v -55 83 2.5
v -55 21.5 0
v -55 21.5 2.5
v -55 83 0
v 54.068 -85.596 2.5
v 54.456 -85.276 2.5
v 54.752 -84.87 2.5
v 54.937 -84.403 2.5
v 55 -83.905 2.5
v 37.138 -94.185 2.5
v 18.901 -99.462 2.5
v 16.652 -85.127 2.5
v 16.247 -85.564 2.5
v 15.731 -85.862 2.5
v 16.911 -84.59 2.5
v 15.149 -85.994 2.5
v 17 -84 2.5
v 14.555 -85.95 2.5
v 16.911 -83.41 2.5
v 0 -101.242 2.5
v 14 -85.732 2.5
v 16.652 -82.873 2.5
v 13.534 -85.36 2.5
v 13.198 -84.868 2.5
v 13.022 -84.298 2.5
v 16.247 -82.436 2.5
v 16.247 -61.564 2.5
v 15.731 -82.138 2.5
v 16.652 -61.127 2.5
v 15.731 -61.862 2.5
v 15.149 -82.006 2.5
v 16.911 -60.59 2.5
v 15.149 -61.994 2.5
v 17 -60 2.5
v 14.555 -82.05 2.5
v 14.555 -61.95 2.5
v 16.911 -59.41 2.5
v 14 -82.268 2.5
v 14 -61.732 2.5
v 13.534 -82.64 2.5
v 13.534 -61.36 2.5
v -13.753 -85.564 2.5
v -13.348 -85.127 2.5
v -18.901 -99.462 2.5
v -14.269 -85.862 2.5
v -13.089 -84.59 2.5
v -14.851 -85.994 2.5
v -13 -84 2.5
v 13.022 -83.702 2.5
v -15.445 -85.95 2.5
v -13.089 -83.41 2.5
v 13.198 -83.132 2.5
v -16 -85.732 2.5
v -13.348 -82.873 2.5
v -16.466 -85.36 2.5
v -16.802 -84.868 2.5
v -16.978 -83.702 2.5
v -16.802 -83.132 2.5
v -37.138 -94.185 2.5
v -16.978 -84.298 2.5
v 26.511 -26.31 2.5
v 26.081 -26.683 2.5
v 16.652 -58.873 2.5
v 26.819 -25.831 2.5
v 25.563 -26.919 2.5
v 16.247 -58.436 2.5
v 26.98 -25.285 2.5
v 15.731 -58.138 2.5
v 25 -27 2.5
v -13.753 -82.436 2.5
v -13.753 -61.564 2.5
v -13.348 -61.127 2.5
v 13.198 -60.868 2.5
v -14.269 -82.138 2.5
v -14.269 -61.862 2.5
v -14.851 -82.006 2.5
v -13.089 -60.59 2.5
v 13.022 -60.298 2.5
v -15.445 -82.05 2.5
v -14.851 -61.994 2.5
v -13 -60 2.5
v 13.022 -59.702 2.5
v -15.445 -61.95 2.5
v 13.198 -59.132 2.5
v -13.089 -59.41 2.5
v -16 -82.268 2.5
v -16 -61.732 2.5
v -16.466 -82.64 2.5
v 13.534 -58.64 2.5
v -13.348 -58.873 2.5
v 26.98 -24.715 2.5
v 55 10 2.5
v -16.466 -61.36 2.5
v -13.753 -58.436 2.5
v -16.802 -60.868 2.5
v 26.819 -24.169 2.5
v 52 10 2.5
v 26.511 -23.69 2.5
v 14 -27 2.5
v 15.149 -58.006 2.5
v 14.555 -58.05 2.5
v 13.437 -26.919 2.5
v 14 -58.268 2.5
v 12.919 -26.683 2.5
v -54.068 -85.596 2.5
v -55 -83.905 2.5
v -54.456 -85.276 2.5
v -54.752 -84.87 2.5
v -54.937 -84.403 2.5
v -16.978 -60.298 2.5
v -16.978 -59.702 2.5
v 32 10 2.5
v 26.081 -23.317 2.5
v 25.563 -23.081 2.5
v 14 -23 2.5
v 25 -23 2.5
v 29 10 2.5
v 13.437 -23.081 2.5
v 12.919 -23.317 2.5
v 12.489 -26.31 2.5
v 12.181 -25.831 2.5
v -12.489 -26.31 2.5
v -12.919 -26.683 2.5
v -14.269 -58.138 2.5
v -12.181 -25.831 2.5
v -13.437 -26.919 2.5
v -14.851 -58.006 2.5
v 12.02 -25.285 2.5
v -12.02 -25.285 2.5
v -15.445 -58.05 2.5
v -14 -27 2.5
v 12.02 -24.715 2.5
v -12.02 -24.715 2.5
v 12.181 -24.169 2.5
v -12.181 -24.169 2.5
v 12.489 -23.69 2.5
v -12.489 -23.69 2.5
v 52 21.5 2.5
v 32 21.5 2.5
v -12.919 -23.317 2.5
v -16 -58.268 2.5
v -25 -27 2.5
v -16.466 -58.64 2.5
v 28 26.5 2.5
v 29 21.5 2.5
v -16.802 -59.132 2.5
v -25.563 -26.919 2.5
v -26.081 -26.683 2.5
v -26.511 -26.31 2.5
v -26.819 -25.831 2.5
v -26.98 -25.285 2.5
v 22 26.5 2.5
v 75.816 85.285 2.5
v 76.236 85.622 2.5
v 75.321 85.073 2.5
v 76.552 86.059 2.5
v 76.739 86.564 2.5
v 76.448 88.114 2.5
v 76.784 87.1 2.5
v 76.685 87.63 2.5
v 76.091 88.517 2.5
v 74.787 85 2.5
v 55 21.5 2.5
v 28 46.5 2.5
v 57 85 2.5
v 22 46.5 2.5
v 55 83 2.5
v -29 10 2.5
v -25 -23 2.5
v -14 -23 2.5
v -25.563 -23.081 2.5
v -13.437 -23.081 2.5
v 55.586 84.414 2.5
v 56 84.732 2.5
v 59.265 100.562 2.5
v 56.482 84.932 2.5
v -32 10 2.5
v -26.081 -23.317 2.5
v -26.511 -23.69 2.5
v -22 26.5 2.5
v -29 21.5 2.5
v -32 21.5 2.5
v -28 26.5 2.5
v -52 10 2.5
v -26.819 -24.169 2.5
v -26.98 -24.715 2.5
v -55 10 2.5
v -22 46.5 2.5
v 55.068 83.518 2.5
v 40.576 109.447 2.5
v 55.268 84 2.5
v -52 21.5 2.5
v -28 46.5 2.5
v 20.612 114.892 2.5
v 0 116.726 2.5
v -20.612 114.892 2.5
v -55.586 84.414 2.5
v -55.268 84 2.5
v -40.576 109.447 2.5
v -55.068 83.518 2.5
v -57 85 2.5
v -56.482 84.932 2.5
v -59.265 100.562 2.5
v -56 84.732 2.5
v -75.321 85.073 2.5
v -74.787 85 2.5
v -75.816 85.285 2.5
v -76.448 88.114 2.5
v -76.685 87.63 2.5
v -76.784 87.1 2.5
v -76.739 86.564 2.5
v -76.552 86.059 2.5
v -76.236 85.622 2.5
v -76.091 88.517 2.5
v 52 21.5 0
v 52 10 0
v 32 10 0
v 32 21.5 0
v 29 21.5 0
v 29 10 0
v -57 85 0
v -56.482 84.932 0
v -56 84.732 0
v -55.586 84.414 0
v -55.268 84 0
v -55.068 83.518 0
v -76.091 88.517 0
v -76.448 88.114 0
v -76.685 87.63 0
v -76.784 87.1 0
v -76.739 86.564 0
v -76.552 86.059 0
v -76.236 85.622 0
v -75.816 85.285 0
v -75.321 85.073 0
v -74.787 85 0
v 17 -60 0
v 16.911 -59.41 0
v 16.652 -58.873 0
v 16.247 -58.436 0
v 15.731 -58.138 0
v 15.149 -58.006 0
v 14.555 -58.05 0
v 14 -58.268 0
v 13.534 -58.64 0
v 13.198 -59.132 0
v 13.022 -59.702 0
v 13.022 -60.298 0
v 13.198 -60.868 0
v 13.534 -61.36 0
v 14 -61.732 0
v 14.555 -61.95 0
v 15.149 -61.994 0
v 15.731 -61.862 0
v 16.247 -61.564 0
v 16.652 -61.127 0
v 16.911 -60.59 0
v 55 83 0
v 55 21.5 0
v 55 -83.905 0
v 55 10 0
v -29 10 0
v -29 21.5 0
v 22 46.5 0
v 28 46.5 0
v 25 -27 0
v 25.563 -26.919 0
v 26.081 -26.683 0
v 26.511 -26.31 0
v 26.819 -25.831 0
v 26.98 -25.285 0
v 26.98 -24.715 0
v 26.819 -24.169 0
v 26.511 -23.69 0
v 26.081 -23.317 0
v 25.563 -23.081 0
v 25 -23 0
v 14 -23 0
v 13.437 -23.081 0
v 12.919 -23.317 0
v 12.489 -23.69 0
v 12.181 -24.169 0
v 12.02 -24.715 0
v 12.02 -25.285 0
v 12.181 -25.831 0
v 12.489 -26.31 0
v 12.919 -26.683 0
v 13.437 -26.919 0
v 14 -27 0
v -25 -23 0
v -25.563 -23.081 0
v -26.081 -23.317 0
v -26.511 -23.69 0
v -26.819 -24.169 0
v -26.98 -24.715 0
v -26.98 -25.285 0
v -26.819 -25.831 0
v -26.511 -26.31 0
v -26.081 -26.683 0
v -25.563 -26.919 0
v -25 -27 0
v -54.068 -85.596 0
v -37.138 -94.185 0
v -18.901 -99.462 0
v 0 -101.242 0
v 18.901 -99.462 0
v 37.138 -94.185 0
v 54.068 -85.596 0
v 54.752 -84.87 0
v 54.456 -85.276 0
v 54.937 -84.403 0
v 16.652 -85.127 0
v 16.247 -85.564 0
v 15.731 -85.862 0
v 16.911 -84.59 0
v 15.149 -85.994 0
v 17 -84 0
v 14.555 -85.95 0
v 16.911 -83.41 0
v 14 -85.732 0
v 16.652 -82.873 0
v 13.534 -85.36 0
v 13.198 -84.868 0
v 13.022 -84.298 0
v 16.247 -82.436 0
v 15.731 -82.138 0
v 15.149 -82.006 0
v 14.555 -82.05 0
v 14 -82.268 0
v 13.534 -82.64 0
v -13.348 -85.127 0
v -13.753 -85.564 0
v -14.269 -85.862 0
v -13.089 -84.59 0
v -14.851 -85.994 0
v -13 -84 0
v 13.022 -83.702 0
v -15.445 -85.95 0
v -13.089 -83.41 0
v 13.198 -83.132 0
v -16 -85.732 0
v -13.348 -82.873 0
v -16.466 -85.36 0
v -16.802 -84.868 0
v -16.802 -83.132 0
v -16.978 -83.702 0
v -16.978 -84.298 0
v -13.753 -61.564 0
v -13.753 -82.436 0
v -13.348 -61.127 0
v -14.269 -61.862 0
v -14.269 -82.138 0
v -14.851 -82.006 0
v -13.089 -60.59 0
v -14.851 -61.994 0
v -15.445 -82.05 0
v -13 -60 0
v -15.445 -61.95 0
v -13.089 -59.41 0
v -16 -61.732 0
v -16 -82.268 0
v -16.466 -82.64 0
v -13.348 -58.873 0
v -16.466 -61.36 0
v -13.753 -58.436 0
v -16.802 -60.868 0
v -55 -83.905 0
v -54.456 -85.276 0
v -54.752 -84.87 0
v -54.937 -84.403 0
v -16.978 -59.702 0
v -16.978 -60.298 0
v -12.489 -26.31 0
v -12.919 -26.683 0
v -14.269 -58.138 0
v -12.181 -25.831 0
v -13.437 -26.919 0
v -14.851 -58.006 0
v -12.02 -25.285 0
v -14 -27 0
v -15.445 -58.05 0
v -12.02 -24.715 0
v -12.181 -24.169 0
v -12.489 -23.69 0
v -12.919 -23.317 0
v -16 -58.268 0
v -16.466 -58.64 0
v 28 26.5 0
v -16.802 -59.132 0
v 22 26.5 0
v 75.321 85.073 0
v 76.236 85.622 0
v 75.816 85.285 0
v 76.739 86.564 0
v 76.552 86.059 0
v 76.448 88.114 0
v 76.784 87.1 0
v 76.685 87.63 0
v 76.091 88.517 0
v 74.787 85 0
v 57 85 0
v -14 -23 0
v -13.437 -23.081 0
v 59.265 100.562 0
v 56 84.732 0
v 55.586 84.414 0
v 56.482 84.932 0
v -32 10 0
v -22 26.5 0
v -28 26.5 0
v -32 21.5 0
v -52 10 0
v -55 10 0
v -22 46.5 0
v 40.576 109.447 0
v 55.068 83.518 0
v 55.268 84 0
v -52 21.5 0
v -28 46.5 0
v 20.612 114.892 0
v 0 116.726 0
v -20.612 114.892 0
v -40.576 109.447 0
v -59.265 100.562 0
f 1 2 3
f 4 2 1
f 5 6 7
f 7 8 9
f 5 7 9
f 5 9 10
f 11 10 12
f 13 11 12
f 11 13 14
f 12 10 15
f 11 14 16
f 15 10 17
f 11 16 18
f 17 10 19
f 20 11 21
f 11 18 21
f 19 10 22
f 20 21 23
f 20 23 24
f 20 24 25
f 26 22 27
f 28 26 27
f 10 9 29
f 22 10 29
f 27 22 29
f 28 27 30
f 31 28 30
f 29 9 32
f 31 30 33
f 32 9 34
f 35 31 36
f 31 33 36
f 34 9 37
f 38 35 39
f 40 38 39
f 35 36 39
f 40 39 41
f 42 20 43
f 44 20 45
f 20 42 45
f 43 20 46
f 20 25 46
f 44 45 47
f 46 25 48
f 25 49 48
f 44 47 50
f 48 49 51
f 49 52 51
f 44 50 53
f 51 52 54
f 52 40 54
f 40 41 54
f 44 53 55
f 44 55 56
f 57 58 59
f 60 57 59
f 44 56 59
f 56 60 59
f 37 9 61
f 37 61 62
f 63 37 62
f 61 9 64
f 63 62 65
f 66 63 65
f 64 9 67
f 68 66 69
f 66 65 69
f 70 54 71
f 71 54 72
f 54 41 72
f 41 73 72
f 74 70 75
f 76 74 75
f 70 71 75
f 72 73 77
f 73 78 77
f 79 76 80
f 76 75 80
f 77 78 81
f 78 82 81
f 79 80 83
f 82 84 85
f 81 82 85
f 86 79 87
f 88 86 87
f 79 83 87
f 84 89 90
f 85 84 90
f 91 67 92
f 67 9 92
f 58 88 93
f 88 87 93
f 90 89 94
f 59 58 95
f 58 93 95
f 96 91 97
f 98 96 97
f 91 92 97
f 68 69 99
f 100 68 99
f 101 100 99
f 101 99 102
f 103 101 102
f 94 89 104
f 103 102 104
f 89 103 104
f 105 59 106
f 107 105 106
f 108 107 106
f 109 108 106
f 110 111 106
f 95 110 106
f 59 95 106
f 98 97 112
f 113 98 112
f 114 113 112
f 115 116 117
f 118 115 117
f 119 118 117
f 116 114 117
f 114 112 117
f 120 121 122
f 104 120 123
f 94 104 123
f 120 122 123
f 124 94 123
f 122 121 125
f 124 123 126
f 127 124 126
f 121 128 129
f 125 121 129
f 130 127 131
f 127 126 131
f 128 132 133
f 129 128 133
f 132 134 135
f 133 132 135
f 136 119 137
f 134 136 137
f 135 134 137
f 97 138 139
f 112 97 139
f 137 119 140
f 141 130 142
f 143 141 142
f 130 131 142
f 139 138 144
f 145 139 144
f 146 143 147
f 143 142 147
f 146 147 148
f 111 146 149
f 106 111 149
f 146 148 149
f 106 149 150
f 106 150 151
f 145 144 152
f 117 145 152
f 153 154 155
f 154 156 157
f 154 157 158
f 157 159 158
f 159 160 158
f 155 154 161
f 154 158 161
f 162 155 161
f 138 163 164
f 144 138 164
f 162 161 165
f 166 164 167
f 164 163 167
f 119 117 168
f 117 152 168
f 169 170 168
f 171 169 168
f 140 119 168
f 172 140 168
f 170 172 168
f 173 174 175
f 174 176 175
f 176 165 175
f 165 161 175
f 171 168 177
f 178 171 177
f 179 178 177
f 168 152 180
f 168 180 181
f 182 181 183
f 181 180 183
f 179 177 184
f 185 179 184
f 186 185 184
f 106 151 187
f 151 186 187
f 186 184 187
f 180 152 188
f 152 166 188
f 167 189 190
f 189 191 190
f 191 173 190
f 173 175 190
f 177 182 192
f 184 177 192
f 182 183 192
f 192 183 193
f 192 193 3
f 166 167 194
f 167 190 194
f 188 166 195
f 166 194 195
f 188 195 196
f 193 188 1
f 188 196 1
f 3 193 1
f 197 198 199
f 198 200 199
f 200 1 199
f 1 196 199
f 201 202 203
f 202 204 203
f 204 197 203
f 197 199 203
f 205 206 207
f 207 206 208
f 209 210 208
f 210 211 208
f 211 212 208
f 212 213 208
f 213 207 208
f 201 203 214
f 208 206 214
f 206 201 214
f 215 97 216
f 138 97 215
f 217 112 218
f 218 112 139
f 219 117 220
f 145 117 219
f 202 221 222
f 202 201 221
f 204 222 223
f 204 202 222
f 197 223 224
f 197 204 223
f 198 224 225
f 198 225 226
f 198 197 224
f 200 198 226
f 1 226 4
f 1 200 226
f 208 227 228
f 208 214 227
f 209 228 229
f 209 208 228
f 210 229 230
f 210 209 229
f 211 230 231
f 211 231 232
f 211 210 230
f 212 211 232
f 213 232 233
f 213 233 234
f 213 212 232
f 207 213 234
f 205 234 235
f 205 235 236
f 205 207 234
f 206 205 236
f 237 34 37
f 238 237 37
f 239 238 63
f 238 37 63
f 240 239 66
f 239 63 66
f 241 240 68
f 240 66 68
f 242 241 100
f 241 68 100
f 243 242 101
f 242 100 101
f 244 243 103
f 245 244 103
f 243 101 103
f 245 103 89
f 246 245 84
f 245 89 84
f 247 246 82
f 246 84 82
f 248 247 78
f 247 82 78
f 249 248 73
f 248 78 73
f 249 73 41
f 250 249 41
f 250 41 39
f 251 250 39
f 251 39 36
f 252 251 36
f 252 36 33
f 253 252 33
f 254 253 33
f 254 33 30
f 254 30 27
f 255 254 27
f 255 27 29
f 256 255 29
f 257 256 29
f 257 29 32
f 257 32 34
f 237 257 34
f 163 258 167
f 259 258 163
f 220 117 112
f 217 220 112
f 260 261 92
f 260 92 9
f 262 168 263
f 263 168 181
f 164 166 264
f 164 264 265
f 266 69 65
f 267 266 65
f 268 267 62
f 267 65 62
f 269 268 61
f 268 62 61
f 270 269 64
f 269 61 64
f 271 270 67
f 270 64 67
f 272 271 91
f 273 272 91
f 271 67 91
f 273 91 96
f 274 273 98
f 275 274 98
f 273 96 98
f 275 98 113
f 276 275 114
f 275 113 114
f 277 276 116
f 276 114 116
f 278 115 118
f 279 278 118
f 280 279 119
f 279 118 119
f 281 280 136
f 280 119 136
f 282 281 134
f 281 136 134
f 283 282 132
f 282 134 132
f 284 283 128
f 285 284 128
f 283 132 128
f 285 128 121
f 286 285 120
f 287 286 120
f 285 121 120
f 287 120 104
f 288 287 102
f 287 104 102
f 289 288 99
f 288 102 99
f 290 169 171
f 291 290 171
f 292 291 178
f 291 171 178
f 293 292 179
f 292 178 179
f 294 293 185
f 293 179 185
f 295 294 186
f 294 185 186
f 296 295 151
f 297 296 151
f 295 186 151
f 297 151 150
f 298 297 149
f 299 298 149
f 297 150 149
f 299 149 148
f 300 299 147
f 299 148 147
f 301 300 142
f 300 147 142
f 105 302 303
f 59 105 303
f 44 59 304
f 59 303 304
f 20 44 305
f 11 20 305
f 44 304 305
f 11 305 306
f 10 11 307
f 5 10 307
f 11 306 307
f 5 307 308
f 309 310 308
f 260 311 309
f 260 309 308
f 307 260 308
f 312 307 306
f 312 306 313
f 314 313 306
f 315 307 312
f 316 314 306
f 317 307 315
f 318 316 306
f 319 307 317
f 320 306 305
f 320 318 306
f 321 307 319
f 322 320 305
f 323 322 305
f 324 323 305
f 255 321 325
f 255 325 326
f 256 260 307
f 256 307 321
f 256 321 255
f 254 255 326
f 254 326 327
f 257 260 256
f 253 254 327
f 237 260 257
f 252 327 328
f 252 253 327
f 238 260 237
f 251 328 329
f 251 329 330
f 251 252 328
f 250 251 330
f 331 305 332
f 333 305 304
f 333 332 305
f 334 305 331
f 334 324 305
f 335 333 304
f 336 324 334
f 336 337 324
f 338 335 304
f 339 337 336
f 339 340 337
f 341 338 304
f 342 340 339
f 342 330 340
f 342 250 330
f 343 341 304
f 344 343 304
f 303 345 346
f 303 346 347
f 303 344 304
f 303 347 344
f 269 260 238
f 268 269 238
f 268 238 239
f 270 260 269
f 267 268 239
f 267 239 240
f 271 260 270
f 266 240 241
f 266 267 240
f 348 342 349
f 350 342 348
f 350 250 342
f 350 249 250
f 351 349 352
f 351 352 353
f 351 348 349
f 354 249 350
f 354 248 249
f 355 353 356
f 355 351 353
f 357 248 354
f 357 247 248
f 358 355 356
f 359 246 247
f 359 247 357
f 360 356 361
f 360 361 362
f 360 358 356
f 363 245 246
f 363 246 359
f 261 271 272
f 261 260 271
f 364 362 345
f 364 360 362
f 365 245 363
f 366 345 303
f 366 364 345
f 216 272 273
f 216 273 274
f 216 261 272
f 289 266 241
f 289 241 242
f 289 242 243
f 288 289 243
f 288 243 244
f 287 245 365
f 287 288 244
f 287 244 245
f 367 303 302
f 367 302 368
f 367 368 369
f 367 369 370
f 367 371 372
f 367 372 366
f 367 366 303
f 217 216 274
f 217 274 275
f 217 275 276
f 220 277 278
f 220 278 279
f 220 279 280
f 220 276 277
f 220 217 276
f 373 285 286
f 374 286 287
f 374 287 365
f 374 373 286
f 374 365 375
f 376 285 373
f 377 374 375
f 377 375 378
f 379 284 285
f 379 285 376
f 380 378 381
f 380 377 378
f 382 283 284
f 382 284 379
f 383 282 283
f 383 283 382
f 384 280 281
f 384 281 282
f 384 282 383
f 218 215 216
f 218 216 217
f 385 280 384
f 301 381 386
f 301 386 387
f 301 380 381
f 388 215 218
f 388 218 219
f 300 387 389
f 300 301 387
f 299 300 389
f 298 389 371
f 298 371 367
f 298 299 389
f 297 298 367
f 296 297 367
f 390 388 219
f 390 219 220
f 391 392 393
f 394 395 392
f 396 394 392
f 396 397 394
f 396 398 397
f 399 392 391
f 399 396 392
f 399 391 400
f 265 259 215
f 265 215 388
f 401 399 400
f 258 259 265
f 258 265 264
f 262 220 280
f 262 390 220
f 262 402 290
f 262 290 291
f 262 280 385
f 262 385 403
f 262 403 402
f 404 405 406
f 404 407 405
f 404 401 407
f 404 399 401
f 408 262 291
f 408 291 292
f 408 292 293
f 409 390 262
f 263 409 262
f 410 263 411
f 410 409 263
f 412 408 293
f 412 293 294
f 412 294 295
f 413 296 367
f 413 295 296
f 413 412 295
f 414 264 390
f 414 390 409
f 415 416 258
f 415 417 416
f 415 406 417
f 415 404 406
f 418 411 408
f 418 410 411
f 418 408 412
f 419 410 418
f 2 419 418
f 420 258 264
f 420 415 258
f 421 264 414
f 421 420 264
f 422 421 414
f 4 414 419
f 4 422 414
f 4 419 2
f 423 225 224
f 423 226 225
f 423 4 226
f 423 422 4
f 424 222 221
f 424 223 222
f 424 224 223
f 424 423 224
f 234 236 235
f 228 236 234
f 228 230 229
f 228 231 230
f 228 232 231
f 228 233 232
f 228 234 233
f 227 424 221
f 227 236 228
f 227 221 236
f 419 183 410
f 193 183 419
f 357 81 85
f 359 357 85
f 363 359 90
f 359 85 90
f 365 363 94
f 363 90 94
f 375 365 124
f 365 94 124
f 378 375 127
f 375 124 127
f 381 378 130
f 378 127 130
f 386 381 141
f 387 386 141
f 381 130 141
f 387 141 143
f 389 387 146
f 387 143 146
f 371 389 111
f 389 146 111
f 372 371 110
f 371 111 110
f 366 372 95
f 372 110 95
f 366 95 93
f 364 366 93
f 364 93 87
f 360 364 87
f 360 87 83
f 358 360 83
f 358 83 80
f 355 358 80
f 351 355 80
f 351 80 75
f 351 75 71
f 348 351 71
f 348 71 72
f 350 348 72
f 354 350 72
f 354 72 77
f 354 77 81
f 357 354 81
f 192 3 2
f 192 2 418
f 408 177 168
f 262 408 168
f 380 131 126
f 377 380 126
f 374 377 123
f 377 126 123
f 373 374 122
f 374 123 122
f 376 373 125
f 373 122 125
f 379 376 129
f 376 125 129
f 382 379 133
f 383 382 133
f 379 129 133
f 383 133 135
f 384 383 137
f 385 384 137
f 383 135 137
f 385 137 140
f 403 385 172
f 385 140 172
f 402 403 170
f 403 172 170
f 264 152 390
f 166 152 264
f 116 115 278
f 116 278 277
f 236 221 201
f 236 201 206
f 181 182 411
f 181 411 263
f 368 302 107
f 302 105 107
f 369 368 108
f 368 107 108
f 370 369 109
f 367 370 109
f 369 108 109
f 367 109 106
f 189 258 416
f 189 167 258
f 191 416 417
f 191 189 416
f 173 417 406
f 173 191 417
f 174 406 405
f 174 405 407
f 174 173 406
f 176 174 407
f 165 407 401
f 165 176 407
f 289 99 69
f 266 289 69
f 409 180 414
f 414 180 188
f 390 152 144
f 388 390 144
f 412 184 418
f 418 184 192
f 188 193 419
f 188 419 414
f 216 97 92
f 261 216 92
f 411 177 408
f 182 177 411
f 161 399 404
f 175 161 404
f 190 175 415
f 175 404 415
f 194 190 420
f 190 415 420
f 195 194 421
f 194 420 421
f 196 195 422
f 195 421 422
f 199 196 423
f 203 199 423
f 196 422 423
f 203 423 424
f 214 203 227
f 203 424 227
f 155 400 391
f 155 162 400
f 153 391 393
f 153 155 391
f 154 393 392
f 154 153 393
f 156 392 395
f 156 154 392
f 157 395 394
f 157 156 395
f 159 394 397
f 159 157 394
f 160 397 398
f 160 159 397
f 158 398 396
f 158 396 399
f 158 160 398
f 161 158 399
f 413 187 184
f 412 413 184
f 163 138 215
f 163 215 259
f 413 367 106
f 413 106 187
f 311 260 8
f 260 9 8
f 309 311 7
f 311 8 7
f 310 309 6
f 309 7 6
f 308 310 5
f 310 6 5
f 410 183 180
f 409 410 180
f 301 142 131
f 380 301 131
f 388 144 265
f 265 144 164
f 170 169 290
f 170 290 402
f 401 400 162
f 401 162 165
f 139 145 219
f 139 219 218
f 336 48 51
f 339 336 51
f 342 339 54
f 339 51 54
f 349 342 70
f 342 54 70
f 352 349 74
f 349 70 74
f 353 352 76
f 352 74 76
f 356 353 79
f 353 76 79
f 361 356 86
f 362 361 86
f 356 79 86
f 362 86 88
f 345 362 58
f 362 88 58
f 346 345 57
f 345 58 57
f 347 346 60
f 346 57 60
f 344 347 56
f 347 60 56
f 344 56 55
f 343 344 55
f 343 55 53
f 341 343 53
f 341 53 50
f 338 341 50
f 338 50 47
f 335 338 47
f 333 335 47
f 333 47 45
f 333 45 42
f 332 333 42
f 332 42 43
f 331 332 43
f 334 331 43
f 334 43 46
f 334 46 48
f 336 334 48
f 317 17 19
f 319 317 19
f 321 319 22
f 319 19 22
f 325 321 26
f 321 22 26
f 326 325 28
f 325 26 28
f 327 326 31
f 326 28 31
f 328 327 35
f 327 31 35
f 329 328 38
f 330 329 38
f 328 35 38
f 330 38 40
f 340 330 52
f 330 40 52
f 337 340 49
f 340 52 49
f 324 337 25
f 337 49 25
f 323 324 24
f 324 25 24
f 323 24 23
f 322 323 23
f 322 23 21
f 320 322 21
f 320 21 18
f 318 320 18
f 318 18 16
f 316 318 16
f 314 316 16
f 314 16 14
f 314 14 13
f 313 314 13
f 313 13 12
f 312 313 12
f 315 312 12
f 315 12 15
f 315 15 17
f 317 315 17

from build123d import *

# Parameters (mm, degrees)
PAD_DEPTH       = 2.5
SKETCH001_W     = 3
SKETCH001_H     = 11.5
POCKET_DEPTH    = 2.501
FILLET_R        = 2
FILLET001_R     = 2
SKETCH002_W     = 6
SKETCH002_H     = 20
POCKET001_DEPTH = 2.501
SKETCH003_R     = 2
POCKET002_DEPTH = 2.501
POCKET003_DEPTH = 2.501


with BuildPart() as part:
    # Sketch → Pad (new body)
    with BuildSketch(Plane.XY):
        with BuildLine():
            Line((55, 85), (55, -85))
            ThreePointArc((-55, -85), (0, -101.242284), (55, -85))
            Line((-55, -85), (-55, 85))
            Line((-55, 85), (-80, 85))
            ThreePointArc((80, 85), (0, 116.726175), (-80, 85))
            Line((80, 85), (55, 85))
        make_face()
    extrude(amount=PAD_DEPTH)

    # Sketch001 → Pocket (cut, through all)
    with BuildSketch(Plane.XY.offset(2.5)):
        with Locations((-53.5, 15.75)):
            Rectangle(SKETCH001_W, SKETCH001_H)
        with Locations((53.5, 15.75)):
            Rectangle(SKETCH001_W, SKETCH001_H)
        with Locations((-30.5, 15.75)):
            Rectangle(SKETCH001_W, SKETCH001_H)
        with Locations((30.5, 15.75)):
            Rectangle(SKETCH001_W, SKETCH001_H)
    extrude(amount=-POCKET_DEPTH, mode=Mode.SUBTRACT)

    # Fillet
    fillet_edges = [part.edges().sort_by_distance(p)[0] for p in [
        (-55, 85, 1.25),
        (55, 85, 1.25),
    ]]
    fillet(fillet_edges, radius=FILLET_R)

    # Fillet001
    fillet001_edges = [part.edges().sort_by_distance(p)[0] for p in [
        (80, 85, 1.25),
        (-80, 85, 1.25),
        (-55, -85, 1.25),
        (55, -85, 1.25),
    ]]
    fillet(fillet001_edges, radius=FILLET001_R)

    # Sketch002 → Pocket001 (cut, through all)
    with BuildSketch(Plane.XY.offset(2.5)):
        with Locations((-25, 36.5)):
            Rectangle(SKETCH002_W, SKETCH002_H)
        with Locations((25, 36.5)):
            Rectangle(SKETCH002_W, SKETCH002_H)
    extrude(amount=-POCKET001_DEPTH, mode=Mode.SUBTRACT)

    # Sketch003 → Pocket002 (cut, through all)
    with BuildSketch(Plane.XY.offset(2.5)):
        with Locations((-15, -60)):
            Circle(SKETCH003_R)
        with Locations((15, -60)):
            Circle(SKETCH003_R)
        with Locations((15, -84)):
            Circle(SKETCH003_R)
        with Locations((-15, -84)):
            Circle(SKETCH003_R)
    extrude(amount=-POCKET002_DEPTH, mode=Mode.SUBTRACT)

    # Sketch004 → Pocket003 (cut, through all)
    with BuildSketch(Plane.XY.offset(2.5)):
        with BuildLine():
            ThreePointArc((-25, -23), (-27, -25), (-25, -27))
            Line((-25, -27), (-14, -27))
            ThreePointArc((-14, -27), (-12, -25), (-14, -23))
            Line((-25, -23), (-14, -23))
        make_face()
        with BuildLine():
            ThreePointArc((14, -23), (12, -25), (14, -27))
            Line((14, -27), (25, -27))
            ThreePointArc((25, -27), (27, -25), (25, -23))
            Line((14, -23), (25, -23))
        make_face()
    extrude(amount=-POCKET003_DEPTH, mode=Mode.SUBTRACT)


solid = part.part
